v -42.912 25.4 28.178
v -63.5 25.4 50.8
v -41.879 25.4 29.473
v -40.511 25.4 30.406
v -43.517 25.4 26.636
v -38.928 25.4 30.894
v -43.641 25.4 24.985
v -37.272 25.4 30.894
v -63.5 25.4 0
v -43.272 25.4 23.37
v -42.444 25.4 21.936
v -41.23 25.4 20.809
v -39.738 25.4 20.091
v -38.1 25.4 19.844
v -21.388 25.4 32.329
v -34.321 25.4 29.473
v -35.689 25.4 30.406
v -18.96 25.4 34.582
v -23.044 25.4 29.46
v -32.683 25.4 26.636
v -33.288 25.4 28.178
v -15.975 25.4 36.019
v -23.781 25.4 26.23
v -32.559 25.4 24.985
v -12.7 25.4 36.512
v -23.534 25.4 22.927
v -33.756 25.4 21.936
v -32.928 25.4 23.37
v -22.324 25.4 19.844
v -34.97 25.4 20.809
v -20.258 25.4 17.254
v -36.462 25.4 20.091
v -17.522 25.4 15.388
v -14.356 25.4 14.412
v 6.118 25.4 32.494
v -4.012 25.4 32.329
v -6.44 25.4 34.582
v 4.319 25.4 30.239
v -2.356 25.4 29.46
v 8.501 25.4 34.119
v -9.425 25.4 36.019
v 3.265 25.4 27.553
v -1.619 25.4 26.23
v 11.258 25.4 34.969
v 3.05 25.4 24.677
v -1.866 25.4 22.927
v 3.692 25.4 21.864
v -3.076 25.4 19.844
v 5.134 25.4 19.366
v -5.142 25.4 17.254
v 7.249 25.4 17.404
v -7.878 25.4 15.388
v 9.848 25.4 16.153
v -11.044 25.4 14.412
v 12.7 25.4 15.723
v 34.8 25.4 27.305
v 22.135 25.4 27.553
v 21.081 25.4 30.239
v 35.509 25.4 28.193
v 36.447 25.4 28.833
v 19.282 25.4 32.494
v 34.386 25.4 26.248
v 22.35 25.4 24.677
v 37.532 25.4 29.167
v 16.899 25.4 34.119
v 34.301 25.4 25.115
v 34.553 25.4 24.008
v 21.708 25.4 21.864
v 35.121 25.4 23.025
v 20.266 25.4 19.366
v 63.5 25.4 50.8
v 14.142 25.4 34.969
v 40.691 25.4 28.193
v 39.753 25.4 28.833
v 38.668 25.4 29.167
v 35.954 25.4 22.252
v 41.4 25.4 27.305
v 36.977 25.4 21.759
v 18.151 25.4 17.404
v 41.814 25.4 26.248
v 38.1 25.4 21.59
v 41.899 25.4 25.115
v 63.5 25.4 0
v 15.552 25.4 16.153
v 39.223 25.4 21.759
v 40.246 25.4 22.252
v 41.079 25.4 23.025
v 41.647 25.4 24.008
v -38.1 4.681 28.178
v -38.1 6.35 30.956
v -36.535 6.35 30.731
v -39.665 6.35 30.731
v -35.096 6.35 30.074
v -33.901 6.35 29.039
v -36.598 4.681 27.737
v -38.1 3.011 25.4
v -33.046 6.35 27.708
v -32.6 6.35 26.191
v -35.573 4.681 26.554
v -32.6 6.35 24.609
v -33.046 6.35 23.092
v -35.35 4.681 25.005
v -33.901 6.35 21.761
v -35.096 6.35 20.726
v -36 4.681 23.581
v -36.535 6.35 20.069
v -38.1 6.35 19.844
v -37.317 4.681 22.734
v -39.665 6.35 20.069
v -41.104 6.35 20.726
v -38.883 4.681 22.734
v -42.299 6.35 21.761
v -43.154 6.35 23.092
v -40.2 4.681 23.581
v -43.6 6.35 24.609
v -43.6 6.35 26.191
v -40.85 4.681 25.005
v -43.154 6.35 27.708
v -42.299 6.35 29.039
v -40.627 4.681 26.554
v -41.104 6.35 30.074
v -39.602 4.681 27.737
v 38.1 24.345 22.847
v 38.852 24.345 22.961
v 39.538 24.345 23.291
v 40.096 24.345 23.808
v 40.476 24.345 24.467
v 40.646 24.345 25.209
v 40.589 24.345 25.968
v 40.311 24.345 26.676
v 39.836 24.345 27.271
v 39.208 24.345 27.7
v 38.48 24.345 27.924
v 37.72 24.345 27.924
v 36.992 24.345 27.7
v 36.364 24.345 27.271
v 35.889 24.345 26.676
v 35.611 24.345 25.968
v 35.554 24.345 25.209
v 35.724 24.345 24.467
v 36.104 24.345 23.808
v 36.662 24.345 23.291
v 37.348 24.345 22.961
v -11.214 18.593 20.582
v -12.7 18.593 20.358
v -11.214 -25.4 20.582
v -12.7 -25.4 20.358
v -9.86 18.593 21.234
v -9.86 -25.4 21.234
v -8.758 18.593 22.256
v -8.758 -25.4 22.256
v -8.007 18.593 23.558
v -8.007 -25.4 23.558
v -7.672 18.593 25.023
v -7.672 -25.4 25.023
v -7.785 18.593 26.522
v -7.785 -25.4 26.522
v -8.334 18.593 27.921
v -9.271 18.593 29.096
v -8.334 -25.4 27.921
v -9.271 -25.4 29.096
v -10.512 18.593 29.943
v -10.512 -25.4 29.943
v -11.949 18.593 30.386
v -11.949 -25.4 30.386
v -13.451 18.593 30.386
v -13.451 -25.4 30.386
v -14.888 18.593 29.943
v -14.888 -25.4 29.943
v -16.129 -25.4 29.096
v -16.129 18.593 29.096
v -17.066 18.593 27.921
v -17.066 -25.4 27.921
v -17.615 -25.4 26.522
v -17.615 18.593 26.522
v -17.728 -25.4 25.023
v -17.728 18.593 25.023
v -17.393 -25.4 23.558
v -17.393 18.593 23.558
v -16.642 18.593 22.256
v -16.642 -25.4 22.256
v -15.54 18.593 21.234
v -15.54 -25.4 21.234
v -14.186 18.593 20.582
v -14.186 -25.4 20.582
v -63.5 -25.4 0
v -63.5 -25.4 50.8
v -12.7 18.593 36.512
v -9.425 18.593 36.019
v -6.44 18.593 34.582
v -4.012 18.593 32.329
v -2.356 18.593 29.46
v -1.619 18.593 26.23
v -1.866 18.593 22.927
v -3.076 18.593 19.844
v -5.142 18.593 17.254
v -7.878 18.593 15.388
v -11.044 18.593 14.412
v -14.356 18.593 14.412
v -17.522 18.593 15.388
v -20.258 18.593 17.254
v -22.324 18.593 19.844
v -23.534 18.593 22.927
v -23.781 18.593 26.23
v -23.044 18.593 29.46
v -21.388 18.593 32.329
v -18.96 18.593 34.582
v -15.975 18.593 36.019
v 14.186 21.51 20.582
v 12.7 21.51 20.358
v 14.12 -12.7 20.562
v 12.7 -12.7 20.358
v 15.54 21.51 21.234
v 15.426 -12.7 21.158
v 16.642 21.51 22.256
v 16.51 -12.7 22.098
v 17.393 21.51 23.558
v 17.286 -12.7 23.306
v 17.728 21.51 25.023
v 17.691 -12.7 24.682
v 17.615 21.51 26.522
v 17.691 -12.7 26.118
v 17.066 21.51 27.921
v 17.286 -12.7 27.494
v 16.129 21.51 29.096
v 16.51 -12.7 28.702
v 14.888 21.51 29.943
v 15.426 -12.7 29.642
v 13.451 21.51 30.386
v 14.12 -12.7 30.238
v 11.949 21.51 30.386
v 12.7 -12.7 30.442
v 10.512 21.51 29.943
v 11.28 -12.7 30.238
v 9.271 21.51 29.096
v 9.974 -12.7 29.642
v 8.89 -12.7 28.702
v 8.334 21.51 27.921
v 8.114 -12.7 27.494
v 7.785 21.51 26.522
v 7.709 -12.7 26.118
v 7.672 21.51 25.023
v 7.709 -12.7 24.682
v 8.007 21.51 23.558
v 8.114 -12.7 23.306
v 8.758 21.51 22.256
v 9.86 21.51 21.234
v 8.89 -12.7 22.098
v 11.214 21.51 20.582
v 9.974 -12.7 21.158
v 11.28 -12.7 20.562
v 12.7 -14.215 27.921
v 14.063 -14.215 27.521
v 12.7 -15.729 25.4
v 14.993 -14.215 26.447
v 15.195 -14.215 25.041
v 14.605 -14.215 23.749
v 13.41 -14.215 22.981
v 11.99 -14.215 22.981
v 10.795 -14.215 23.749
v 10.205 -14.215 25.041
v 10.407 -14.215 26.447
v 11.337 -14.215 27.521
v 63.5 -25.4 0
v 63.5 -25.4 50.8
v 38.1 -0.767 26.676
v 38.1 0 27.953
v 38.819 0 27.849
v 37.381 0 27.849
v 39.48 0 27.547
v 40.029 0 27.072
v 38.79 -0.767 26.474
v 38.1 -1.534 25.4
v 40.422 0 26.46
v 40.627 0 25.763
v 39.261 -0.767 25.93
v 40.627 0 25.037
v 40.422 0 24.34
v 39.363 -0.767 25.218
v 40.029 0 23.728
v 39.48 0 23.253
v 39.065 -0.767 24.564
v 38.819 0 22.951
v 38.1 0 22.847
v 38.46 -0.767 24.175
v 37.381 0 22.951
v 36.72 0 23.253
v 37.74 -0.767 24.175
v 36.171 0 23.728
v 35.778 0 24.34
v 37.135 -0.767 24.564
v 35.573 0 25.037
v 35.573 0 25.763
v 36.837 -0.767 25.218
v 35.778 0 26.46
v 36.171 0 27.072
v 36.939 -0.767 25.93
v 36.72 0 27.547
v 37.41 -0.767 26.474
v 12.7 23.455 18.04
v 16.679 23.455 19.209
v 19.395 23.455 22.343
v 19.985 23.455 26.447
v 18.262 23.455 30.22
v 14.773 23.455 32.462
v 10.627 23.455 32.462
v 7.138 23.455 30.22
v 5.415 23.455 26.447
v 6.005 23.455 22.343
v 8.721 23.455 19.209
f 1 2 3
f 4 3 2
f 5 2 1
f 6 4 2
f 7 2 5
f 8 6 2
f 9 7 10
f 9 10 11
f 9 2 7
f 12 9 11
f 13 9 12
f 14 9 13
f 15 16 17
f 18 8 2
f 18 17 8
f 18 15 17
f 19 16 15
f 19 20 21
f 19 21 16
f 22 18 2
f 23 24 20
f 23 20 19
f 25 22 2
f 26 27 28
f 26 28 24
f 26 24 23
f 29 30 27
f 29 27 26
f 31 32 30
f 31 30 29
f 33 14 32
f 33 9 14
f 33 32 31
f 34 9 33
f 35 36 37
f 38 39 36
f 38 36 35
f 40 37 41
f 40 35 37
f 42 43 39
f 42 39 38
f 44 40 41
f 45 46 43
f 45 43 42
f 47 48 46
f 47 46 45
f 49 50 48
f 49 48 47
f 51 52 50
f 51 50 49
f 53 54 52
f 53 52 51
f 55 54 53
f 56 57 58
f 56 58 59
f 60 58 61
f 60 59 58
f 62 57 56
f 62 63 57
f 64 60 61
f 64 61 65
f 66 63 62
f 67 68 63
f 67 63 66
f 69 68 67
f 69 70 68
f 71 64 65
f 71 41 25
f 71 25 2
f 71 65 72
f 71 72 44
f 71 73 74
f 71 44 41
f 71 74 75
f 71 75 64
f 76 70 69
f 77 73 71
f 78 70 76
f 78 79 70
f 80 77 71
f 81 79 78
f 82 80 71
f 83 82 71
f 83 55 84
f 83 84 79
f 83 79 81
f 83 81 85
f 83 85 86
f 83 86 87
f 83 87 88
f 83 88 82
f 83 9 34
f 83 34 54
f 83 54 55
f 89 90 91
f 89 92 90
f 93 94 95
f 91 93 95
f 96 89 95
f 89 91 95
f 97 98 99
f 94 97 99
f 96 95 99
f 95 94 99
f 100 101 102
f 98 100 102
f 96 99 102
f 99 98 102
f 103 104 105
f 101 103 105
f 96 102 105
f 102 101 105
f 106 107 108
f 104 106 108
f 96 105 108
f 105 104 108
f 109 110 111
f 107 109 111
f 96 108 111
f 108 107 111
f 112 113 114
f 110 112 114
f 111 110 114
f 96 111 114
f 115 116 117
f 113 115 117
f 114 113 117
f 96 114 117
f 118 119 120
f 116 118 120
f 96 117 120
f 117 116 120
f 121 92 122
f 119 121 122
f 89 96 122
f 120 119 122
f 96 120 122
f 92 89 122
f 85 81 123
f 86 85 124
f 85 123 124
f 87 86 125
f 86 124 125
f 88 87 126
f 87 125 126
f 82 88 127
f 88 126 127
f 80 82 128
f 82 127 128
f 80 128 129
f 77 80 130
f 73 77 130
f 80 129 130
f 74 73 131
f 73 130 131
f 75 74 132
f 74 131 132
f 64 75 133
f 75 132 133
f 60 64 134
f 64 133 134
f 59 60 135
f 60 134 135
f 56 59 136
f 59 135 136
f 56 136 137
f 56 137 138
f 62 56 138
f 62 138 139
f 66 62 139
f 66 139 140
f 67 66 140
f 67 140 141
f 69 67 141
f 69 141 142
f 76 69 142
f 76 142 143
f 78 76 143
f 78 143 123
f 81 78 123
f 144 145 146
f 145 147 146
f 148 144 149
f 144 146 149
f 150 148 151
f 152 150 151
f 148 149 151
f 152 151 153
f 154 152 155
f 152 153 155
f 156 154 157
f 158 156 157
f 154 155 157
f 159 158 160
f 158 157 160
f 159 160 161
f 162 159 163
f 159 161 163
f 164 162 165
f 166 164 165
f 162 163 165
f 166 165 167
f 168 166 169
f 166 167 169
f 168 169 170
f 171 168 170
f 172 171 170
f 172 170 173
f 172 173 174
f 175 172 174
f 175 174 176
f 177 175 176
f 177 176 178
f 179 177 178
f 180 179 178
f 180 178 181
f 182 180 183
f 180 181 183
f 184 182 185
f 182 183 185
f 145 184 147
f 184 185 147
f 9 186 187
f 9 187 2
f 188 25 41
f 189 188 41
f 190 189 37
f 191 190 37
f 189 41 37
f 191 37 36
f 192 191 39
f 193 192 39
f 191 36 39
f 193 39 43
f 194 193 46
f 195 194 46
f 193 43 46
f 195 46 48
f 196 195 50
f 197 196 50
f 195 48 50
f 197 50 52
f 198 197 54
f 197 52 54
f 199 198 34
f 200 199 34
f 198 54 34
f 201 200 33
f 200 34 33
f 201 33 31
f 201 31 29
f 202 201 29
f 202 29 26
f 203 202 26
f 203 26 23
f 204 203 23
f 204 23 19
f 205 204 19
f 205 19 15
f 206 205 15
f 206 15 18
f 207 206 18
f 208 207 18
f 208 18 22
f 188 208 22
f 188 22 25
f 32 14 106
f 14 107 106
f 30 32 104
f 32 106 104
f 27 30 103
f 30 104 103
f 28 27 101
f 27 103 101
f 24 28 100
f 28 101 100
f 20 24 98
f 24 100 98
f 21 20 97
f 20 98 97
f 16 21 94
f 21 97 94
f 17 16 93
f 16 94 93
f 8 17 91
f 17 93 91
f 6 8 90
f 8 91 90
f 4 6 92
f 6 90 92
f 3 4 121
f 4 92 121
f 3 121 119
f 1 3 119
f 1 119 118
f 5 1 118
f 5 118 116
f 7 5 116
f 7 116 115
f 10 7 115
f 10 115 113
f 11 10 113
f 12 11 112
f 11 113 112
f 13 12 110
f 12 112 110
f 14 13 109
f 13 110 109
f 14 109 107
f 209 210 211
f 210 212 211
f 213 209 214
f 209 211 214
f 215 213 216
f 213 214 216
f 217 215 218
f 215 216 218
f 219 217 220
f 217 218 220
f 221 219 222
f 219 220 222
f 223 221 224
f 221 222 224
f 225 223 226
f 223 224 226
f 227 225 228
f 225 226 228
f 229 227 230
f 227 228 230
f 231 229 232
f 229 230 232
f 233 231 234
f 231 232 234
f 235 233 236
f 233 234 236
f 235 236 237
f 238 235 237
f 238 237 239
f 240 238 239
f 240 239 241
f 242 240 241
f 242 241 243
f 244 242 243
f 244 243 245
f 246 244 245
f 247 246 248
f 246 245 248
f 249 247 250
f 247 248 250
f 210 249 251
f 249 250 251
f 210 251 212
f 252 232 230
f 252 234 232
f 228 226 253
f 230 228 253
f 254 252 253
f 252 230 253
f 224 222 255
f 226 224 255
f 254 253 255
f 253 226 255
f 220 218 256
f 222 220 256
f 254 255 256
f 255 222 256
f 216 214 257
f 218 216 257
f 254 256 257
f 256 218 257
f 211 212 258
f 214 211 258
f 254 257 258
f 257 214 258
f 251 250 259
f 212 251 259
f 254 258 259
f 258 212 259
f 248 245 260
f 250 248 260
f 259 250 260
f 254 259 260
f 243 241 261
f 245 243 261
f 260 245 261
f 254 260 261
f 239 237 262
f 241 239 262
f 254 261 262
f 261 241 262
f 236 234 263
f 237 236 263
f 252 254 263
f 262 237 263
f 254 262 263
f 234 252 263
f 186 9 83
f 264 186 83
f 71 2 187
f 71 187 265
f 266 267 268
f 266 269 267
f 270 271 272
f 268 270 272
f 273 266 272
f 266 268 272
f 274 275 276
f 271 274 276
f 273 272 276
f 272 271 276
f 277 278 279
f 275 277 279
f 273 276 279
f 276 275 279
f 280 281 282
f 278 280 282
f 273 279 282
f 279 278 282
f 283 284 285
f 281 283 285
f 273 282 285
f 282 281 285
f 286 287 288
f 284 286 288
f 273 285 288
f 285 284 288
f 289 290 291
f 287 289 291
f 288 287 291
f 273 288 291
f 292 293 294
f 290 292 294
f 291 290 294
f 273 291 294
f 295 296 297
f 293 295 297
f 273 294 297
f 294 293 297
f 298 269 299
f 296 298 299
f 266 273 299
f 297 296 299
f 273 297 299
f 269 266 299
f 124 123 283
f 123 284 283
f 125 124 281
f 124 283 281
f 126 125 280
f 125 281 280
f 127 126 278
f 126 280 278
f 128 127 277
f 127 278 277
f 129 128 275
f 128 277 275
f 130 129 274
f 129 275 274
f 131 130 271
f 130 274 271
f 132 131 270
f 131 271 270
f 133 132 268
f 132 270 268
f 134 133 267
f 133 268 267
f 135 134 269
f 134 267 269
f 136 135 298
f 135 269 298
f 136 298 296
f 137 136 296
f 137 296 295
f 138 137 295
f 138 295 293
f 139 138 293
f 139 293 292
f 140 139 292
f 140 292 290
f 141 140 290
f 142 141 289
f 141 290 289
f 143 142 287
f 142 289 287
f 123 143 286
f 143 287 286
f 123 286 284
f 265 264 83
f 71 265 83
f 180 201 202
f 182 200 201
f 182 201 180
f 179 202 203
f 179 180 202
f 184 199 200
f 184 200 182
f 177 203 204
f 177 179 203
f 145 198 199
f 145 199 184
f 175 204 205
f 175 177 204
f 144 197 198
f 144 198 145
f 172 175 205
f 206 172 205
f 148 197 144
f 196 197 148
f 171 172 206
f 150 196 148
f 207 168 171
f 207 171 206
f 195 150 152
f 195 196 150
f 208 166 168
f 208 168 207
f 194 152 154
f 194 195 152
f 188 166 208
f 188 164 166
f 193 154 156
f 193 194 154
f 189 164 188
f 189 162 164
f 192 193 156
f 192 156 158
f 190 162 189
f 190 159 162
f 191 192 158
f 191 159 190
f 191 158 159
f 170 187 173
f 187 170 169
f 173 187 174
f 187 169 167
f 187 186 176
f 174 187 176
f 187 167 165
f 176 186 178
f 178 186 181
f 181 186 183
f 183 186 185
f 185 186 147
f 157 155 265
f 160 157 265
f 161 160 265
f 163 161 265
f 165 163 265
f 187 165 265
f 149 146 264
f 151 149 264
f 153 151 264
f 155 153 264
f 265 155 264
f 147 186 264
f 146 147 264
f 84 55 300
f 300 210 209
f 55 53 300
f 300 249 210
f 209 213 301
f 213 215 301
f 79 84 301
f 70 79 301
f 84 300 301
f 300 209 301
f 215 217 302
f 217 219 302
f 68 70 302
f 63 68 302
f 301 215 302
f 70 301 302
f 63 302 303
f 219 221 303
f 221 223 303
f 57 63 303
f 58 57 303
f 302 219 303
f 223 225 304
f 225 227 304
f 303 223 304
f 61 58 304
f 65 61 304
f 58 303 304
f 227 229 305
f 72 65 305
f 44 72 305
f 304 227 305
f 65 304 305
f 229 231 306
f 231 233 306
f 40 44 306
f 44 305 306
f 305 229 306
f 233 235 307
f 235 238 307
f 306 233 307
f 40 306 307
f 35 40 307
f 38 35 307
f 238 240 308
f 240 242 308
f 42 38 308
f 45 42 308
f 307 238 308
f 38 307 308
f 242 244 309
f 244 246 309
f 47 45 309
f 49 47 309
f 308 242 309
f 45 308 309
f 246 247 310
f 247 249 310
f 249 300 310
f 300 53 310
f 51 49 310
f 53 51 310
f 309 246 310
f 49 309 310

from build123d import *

# Parameters (mm, degrees)
SKETCH1_W                                           = 127
SKETCH1_H                                           = 50.8
BOSS_EXTRUDE1_DEPTH                                 = 50.8
F_7_16_0_4375_DIAMETER_HOLE2_D                      = 11.1125
F_7_16_0_4375_DIAMETER_HOLE2_DEPTH                  = 19.05
F_7_16_0_4375_DIAMETER_HOLE2_TIP                    = 3.338531814
CBORE_FOR_3_8_HEX_HEAD_BOLT1_D                      = 10.0838
CBORE_FOR_3_8_HEX_HEAD_BOLT1_CBORE_D                = 22.225
CBORE_FOR_3_8_HEX_HEAD_BOLT1_CBORE_DEPTH            = 6.8072
CSK_FOR_3_8_FLAT_HEAD_MACHINE_SCREW_100_D           = 10.0838
CSK_FOR_3_8_FLAT_HEAD_MACHINE_SCREW_100_DEPTH       = 38.1
CSK_FOR_3_8_FLAT_HEAD_MACHINE_SCREW_100_CSINK_D     = 19.3548
CSK_FOR_3_8_FLAT_HEAD_MACHINE_SCREW_100_CSINK_ANGLE = 100
CSK_FOR_3_8_FLAT_HEAD_MACHINE_SCREW_100_TIP         = 3.029479155
F_1_4_20_TAPPED_HOLE1_D                             = 5.1054
F_1_4_20_TAPPED_HOLE1_DEPTH                         = 25.4
F_1_4_20_TAPPED_HOLE1_CSINK_D                       = 7.62
F_1_4_20_TAPPED_HOLE1_CSINK_ANGLE                   = 100
F_1_4_20_TAPPED_HOLE1_TIP                           = 1.533816902


with BuildPart() as part:
    # Sketch1 → Boss-Extrude1 (new body)
    with BuildSketch(Plane.XY):
        Rectangle(SKETCH1_W, SKETCH1_H)
    extrude(amount=BOSS_EXTRUDE1_DEPTH)

    # 7/16 (0.4375) Diameter Hole2
    with Locations(Plane(origin=(-38.1, 25.4, 25.4), x_dir=(0, 0, 1), z_dir=(0, 1, 0))):
        with Locations((0, 0)):
            Hole(F_7_16_0_4375_DIAMETER_HOLE2_D / 2, depth=F_7_16_0_4375_DIAMETER_HOLE2_DEPTH)
            with Locations((0, 0, -(F_7_16_0_4375_DIAMETER_HOLE2_DEPTH + F_7_16_0_4375_DIAMETER_HOLE2_TIP / 2))):  # 118° drill point
                Cone(0, F_7_16_0_4375_DIAMETER_HOLE2_D / 2, F_7_16_0_4375_DIAMETER_HOLE2_TIP, mode=Mode.SUBTRACT)

    # CBORE for 3/8 Hex Head Bolt1 (through all)
    with Locations(Plane(origin=(-12.7, 25.4, 25.4), x_dir=(0, 0, 1), z_dir=(0, 1, 0))):
        with Locations((0, 0)):
            CounterBoreHole(CBORE_FOR_3_8_HEX_HEAD_BOLT1_D / 2, CBORE_FOR_3_8_HEX_HEAD_BOLT1_CBORE_D / 2, CBORE_FOR_3_8_HEX_HEAD_BOLT1_CBORE_DEPTH)

    # CSK for 3/8 Flat Head Machine Screw (100)1
    with Locations(Plane(origin=(12.7, 25.4, 25.4), x_dir=(0, 0, 1), z_dir=(0, 1, 0))):
        with Locations((0, 0)):
            CounterSinkHole(CSK_FOR_3_8_FLAT_HEAD_MACHINE_SCREW_100_D / 2, CSK_FOR_3_8_FLAT_HEAD_MACHINE_SCREW_100_CSINK_D / 2, depth=CSK_FOR_3_8_FLAT_HEAD_MACHINE_SCREW_100_DEPTH, counter_sink_angle=CSK_FOR_3_8_FLAT_HEAD_MACHINE_SCREW_100_CSINK_ANGLE)
            with Locations((0, 0, -(CSK_FOR_3_8_FLAT_HEAD_MACHINE_SCREW_100_DEPTH + CSK_FOR_3_8_FLAT_HEAD_MACHINE_SCREW_100_TIP / 2))):  # 118° drill point
                Cone(0, CSK_FOR_3_8_FLAT_HEAD_MACHINE_SCREW_100_D / 2, CSK_FOR_3_8_FLAT_HEAD_MACHINE_SCREW_100_TIP, mode=Mode.SUBTRACT)

    # 1/4-20 Tapped Hole1
    with Locations(Plane(origin=(38.1, 25.4, 25.4), x_dir=(0, 0, 1), z_dir=(0, 1, 0))):
        with Locations((0, 0)):
            CounterSinkHole(F_1_4_20_TAPPED_HOLE1_D / 2, F_1_4_20_TAPPED_HOLE1_CSINK_D / 2, depth=F_1_4_20_TAPPED_HOLE1_DEPTH, counter_sink_angle=F_1_4_20_TAPPED_HOLE1_CSINK_ANGLE)
            with Locations((0, 0, -(F_1_4_20_TAPPED_HOLE1_DEPTH + F_1_4_20_TAPPED_HOLE1_TIP / 2))):  # 118° drill point
                Cone(0, F_1_4_20_TAPPED_HOLE1_D / 2, F_1_4_20_TAPPED_HOLE1_TIP, mode=Mode.SUBTRACT)


solid = part.part
